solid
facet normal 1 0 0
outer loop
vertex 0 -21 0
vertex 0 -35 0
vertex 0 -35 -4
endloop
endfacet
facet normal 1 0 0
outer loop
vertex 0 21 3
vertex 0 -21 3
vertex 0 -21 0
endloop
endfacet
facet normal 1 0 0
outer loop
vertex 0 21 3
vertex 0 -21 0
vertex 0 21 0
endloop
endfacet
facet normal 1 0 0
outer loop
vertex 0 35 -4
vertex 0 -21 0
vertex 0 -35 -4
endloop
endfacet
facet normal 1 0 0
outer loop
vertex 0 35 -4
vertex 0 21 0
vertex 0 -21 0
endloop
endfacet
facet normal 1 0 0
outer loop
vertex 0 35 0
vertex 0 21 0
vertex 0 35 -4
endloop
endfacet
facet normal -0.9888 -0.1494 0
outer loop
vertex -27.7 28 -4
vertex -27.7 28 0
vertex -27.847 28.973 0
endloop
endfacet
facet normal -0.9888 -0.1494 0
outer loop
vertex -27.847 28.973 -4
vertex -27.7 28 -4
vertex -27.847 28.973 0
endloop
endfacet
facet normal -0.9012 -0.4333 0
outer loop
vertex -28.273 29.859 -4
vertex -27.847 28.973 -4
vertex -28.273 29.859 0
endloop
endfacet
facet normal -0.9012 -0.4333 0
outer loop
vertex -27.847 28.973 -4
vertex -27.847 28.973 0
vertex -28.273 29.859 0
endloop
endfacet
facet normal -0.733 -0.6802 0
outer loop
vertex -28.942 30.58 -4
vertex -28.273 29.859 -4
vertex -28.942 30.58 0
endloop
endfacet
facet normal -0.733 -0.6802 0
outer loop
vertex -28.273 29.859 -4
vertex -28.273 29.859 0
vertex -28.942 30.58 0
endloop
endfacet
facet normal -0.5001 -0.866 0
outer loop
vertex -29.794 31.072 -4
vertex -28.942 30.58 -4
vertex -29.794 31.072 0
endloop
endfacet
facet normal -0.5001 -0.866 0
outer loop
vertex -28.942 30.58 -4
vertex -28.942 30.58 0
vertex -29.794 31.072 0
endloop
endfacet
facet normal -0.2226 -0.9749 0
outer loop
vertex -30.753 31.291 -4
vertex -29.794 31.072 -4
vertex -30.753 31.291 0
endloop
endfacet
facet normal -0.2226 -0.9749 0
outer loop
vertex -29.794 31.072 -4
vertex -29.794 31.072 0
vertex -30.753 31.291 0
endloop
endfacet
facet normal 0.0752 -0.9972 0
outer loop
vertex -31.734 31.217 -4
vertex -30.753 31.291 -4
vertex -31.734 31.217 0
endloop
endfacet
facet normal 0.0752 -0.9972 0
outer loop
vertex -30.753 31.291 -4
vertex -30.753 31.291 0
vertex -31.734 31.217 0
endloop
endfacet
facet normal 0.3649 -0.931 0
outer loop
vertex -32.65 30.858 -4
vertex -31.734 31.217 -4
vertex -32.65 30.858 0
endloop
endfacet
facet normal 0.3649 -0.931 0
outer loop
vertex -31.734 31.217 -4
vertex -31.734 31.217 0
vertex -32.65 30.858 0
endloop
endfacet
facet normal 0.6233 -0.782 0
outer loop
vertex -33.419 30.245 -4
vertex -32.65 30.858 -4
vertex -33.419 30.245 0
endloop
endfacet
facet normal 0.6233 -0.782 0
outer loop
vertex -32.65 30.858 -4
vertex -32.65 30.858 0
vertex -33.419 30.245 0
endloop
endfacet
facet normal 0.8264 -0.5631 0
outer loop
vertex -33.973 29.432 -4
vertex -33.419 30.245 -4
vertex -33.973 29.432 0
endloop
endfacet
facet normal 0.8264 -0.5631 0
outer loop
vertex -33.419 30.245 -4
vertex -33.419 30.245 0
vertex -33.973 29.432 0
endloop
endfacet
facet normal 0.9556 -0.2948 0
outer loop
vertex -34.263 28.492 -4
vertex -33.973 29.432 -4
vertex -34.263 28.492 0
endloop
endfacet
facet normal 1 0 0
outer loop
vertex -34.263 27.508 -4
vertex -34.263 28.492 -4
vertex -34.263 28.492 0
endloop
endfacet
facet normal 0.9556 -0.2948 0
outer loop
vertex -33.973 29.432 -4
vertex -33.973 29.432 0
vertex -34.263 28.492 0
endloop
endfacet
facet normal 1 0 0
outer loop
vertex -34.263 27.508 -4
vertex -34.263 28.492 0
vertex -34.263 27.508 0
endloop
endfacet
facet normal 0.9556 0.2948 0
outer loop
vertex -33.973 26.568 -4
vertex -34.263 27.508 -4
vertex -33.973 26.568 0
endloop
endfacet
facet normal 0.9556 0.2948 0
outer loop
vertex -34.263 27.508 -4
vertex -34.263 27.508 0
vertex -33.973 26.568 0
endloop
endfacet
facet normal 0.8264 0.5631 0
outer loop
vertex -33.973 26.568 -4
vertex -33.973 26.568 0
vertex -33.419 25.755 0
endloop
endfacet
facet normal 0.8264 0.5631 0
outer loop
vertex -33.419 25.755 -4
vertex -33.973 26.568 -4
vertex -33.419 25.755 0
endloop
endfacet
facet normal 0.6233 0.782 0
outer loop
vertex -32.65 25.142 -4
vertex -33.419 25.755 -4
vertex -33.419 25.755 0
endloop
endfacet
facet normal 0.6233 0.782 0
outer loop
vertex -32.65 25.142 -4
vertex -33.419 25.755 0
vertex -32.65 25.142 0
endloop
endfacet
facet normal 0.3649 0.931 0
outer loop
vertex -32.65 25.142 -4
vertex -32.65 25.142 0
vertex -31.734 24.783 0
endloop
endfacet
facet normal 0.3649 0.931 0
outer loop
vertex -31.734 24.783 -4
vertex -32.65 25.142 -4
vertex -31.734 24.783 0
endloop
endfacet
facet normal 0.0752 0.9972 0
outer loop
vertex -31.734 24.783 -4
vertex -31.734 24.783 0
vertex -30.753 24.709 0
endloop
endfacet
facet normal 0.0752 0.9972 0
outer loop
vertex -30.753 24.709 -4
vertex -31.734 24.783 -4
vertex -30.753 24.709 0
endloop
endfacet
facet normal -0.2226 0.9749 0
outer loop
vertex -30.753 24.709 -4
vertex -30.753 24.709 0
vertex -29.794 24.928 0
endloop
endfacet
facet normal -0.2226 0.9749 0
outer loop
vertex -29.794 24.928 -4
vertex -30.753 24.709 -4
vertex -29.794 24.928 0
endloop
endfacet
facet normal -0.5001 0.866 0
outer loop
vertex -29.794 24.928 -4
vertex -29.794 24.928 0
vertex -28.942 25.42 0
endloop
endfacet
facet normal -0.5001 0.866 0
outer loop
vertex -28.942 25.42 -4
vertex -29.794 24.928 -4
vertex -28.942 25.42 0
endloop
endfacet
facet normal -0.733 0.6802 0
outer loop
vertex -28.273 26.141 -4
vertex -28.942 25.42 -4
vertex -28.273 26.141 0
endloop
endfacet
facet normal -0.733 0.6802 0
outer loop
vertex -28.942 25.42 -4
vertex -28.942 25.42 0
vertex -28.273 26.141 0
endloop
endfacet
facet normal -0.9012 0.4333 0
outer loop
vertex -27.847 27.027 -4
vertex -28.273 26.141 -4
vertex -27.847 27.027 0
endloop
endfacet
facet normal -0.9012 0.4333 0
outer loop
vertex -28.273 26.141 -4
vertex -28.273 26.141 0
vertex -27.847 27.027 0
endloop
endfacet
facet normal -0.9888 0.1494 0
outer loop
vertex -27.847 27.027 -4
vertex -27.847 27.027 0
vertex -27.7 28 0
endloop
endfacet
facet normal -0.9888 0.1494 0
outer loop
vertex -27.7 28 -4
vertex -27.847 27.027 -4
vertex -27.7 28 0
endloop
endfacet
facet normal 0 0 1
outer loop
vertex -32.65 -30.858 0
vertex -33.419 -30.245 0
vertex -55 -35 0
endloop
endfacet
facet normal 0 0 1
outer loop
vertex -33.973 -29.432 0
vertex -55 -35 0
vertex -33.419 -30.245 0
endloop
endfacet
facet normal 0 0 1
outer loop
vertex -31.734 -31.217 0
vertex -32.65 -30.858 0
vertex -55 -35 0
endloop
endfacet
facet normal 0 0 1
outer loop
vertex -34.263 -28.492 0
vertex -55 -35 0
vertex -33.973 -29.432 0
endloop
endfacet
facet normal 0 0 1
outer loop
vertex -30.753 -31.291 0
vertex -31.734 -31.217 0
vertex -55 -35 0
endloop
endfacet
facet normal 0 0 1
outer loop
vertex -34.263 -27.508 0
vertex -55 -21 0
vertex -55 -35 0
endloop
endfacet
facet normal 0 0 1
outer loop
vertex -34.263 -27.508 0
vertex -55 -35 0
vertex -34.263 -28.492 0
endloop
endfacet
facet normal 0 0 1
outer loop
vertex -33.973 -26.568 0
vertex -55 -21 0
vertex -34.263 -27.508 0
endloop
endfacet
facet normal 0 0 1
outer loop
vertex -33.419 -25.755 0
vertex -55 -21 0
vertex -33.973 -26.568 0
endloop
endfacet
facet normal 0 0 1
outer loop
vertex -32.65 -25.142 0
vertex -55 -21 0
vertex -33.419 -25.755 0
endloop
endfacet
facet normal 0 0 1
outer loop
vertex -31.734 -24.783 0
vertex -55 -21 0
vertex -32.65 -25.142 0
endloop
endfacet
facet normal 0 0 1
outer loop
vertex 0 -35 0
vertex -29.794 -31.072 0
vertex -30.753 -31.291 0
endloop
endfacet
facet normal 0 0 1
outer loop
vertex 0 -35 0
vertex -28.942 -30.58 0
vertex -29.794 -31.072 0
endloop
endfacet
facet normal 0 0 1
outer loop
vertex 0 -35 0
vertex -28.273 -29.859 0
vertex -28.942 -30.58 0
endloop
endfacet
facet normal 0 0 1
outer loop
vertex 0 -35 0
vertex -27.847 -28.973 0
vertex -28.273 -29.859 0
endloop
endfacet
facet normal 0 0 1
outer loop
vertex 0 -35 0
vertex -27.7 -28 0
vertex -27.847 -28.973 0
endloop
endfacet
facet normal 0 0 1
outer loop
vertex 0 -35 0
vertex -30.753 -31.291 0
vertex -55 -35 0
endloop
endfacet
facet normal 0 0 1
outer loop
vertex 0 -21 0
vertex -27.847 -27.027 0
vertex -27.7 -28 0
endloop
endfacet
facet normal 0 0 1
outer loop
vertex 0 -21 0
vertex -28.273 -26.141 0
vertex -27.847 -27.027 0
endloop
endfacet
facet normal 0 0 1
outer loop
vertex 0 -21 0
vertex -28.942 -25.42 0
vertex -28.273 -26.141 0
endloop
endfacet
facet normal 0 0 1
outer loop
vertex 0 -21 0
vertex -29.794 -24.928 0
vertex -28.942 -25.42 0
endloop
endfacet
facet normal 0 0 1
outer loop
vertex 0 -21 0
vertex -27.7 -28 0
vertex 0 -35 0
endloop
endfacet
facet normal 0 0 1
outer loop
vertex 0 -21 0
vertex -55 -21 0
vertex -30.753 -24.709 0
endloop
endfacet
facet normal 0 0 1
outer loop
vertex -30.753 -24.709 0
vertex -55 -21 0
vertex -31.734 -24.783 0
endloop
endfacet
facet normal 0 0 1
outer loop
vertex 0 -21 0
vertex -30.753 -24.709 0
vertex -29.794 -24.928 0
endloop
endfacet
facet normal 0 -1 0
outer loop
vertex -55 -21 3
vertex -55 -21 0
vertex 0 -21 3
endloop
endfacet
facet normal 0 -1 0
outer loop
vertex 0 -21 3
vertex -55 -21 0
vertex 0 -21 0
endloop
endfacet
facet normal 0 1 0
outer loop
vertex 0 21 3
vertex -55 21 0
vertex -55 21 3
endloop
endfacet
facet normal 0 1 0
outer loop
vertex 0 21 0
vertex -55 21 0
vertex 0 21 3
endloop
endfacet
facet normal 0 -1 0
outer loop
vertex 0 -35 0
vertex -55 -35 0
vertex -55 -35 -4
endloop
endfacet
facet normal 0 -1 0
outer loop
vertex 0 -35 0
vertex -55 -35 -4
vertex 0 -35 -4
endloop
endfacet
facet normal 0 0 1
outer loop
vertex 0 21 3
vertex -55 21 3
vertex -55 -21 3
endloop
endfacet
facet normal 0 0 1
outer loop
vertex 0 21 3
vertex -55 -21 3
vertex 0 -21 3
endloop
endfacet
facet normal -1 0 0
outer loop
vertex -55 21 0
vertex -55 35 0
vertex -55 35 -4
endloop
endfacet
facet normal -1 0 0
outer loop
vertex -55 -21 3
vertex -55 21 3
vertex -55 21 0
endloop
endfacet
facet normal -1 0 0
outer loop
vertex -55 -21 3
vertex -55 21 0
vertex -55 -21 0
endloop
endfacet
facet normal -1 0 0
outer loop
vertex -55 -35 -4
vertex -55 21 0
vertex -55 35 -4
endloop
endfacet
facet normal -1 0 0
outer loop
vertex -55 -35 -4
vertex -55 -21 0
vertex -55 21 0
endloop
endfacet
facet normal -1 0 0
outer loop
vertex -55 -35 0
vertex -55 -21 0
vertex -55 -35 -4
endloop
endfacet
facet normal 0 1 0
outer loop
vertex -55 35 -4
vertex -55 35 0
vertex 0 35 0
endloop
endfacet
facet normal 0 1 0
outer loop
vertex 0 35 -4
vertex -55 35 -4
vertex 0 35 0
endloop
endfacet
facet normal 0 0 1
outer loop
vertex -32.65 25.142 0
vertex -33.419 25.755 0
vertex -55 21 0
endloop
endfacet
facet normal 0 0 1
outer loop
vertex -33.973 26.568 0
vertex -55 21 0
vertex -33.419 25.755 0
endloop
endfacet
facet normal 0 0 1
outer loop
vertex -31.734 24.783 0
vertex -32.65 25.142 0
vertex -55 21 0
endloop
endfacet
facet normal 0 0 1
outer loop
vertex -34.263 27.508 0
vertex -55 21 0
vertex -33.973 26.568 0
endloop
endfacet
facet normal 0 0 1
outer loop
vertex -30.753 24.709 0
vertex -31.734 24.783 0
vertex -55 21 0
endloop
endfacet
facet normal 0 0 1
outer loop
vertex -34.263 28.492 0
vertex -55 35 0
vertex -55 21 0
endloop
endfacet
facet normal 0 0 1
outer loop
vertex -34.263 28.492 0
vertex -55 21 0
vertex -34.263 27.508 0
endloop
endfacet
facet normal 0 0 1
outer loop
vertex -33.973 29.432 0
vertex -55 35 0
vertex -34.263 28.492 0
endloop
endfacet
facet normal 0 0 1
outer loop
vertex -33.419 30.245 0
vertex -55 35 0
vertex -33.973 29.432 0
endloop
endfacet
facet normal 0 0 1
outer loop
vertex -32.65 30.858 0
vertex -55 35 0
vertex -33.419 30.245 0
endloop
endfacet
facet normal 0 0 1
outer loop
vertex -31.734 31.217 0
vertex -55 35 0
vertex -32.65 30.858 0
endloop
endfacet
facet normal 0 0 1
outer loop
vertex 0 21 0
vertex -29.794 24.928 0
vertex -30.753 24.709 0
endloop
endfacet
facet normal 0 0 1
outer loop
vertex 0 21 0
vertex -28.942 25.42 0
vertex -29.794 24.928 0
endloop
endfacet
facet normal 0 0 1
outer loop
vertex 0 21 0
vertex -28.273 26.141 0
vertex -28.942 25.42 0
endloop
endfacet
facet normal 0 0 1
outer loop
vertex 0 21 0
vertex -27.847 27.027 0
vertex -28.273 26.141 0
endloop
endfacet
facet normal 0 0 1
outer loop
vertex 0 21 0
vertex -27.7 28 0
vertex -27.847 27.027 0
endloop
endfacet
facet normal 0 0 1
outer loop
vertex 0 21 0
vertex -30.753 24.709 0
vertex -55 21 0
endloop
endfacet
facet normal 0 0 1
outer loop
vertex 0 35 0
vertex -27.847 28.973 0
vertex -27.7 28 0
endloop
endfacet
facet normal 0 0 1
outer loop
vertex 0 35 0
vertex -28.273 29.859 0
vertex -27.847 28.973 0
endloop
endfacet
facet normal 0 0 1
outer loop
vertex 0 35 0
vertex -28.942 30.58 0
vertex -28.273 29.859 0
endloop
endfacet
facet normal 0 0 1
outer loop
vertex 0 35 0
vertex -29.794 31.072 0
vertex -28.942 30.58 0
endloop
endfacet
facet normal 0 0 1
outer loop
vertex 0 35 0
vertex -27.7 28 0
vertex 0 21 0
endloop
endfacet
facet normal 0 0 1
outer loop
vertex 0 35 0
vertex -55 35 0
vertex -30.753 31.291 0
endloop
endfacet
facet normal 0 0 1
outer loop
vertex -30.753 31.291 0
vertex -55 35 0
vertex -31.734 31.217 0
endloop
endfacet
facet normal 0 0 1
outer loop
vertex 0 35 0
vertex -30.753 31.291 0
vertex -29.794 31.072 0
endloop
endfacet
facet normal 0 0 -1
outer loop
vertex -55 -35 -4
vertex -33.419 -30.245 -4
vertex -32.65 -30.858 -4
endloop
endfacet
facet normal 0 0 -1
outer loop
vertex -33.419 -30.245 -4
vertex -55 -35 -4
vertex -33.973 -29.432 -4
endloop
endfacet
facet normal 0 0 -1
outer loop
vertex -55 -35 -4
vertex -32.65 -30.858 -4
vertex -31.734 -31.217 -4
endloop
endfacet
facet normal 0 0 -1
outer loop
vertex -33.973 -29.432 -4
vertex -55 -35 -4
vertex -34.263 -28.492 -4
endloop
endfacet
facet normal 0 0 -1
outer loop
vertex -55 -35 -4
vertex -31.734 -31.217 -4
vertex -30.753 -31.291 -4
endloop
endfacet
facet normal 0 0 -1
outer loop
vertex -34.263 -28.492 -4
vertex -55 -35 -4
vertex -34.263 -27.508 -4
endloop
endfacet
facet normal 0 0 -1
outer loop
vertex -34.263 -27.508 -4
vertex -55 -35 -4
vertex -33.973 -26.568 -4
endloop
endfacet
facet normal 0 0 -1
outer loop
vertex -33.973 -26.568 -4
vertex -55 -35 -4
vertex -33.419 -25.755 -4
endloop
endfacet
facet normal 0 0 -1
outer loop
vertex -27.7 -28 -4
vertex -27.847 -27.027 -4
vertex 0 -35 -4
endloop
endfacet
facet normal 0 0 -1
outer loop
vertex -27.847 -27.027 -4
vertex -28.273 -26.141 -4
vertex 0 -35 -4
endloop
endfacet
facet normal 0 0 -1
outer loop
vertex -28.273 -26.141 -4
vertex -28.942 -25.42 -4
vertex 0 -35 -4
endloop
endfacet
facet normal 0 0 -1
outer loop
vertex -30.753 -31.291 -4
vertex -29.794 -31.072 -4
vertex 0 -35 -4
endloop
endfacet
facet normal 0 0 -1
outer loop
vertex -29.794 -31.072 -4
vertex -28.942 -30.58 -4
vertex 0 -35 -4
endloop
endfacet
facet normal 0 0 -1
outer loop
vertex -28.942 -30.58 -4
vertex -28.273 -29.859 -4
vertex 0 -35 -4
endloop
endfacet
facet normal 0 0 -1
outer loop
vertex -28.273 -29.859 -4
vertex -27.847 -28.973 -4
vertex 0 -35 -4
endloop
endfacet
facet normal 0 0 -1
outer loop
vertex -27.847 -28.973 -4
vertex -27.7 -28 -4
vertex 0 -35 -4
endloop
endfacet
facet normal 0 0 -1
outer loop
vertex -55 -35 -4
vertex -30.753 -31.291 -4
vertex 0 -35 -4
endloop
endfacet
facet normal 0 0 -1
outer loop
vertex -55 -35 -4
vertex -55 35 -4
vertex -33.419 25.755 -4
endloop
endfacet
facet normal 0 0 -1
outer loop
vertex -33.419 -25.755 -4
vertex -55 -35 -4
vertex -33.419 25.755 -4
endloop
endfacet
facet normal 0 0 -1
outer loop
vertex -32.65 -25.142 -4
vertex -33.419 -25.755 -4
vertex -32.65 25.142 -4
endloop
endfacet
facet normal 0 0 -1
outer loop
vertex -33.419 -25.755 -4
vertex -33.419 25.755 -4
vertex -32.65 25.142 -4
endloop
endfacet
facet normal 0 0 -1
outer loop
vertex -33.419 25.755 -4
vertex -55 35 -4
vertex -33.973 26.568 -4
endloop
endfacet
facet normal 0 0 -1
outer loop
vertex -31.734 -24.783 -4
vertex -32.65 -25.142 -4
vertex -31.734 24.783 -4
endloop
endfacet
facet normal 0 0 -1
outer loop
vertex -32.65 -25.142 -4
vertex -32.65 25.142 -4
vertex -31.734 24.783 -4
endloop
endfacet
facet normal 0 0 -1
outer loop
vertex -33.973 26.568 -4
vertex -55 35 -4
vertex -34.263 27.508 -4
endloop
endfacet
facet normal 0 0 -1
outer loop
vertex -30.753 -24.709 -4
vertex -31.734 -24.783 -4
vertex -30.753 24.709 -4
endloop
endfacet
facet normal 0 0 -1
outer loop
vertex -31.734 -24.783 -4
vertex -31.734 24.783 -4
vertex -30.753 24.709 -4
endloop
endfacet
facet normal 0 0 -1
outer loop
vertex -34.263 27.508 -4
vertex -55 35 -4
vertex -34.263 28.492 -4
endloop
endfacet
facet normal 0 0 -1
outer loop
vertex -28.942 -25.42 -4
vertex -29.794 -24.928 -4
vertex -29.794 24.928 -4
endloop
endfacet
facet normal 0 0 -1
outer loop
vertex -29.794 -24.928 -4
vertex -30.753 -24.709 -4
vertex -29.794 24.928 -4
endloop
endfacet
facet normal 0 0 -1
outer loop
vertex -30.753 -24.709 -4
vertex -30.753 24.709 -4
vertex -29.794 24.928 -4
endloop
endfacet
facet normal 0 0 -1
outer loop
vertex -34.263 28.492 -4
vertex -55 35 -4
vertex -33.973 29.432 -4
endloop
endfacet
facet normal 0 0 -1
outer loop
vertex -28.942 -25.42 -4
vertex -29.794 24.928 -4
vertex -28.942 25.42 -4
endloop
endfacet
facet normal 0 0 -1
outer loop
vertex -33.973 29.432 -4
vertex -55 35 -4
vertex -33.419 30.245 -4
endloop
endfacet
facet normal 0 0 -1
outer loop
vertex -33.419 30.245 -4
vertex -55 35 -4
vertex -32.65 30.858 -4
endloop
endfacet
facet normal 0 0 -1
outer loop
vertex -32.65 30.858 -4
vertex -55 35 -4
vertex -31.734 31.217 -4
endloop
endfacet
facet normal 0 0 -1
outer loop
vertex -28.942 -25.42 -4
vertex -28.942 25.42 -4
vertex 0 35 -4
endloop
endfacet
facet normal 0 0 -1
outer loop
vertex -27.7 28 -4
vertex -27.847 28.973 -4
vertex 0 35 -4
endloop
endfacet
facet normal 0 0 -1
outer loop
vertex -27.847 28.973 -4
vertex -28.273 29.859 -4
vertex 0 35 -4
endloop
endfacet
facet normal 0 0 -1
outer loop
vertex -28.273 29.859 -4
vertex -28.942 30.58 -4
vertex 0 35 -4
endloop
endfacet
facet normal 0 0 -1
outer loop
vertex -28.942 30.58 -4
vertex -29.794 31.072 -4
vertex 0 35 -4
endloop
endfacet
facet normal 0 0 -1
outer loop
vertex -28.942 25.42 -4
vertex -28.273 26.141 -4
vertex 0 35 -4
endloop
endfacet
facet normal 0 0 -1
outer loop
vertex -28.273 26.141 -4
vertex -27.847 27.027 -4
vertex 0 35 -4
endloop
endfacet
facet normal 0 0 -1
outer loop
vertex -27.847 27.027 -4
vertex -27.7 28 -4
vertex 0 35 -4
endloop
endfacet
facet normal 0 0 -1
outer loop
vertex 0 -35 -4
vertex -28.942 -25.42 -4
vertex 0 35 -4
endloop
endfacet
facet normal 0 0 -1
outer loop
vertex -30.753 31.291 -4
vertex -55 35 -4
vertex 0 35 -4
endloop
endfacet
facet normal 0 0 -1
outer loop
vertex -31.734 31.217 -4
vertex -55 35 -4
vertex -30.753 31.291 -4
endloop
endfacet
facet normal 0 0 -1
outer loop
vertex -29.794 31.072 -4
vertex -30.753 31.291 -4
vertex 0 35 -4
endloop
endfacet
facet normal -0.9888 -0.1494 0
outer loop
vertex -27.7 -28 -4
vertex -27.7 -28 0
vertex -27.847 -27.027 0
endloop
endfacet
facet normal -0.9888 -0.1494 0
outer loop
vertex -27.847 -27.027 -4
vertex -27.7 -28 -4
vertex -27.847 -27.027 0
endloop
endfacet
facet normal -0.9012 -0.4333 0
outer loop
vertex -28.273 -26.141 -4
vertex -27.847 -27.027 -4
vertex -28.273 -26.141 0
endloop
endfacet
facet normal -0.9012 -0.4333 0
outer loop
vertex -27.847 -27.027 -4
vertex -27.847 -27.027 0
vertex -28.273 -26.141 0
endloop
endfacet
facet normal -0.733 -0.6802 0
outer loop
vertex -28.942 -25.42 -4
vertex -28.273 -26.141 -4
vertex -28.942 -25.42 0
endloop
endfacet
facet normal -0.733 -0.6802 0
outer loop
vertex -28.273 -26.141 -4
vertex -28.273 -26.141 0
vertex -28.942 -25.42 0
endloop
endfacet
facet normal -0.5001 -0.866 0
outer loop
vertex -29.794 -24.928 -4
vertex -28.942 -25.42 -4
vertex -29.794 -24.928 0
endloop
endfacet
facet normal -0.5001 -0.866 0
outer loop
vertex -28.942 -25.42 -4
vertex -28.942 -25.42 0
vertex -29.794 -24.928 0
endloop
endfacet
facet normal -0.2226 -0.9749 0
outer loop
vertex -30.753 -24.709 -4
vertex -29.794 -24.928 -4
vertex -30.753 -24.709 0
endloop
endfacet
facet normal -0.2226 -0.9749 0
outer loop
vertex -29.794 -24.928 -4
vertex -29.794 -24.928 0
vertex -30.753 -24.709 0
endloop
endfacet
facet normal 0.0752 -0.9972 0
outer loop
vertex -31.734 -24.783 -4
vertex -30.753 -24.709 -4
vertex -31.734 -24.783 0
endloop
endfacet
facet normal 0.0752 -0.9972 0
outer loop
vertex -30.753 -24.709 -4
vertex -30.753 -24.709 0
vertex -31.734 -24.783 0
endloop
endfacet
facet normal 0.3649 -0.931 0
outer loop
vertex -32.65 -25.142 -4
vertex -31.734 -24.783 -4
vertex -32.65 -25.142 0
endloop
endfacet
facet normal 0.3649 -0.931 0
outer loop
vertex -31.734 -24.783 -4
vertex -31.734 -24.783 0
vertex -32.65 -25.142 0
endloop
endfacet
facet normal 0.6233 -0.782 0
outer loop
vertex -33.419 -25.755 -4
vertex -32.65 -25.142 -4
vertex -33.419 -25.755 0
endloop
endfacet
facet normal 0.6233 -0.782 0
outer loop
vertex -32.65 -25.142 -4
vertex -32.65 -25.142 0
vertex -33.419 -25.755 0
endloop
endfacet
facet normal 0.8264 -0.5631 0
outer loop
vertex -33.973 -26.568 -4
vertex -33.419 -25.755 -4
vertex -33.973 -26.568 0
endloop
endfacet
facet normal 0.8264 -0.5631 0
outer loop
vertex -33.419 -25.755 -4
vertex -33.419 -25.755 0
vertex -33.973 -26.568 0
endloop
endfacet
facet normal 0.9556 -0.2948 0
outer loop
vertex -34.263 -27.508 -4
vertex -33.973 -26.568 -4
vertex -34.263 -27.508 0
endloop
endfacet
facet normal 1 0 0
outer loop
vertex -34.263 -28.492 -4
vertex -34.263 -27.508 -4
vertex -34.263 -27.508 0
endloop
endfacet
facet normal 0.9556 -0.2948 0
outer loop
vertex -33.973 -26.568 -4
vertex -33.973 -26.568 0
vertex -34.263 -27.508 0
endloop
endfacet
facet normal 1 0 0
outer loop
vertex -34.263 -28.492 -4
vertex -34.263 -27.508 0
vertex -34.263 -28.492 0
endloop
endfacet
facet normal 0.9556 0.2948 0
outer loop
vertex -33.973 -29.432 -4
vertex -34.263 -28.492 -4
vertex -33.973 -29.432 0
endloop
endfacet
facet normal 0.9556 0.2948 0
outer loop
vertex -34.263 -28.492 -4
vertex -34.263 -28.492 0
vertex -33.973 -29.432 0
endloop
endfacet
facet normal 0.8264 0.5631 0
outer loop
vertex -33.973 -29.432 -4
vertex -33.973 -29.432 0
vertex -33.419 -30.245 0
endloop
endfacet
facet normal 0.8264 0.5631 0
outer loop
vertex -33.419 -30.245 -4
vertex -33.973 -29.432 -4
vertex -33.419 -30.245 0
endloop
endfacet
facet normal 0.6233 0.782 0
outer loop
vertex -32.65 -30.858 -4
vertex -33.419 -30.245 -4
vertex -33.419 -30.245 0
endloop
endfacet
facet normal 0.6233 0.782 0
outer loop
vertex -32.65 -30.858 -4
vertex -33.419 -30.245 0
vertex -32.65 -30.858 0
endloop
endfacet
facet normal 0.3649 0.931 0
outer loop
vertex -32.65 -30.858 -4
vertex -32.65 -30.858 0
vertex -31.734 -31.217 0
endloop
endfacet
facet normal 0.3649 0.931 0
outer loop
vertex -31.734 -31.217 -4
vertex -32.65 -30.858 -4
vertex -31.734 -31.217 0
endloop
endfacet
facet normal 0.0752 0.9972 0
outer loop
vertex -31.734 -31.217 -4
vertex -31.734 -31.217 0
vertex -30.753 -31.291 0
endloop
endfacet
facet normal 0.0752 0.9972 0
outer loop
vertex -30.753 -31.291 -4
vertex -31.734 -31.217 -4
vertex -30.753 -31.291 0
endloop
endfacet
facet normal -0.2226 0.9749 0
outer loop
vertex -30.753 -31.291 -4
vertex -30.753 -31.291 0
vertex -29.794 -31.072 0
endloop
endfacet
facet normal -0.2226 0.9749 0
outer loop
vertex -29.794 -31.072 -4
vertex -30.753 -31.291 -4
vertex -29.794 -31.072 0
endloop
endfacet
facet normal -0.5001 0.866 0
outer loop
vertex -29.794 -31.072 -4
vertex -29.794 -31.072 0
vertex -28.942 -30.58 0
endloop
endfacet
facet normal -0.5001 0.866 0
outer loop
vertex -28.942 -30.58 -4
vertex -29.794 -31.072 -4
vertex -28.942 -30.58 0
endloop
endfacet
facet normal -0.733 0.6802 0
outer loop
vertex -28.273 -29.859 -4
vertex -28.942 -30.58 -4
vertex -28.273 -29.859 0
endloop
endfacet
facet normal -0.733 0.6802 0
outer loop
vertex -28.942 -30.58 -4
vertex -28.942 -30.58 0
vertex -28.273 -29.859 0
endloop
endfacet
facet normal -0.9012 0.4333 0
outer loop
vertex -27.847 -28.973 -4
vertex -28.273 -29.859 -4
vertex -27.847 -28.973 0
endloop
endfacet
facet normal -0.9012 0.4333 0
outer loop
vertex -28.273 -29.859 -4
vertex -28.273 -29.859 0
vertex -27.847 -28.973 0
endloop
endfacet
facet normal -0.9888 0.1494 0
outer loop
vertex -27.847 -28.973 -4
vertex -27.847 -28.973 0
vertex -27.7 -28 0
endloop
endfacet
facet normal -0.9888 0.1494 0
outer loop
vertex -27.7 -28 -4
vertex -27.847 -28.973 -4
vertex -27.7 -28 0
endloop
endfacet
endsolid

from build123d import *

# Parameters (mm, degrees)
F0_W     = 55
F0_H     = 14
F0_R     = 3.3
F0_H_2   = 42
F1_DEPTH = 4
F2_DEPTH = 3


with BuildPart() as f1:
    # F0 (on Top) → F1 (new body)
    with BuildSketch(Plane.XY):
        with Locations((-27.5, 28)):
            Rectangle(F0_W, F0_H)
        with Locations((-31, 28)):
            Circle(F0_R, mode=Mode.SUBTRACT)
        with Locations((-27.5, 0)):
            Rectangle(F0_W, F0_H_2)
        with Locations((-27.5, -28)):
            Rectangle(F0_W, F0_H)
        with Locations((-31, -28)):
            Circle(F0_R, mode=Mode.SUBTRACT)
    extrude(amount=-F1_DEPTH)

    # F0 (on Top) → F2 (join)
    with BuildSketch(Plane.XY):
        with Locations((-27.5, 0)):
            Rectangle(F0_W, F0_H_2)
    extrude(amount=F2_DEPTH)


solid = f1.part
